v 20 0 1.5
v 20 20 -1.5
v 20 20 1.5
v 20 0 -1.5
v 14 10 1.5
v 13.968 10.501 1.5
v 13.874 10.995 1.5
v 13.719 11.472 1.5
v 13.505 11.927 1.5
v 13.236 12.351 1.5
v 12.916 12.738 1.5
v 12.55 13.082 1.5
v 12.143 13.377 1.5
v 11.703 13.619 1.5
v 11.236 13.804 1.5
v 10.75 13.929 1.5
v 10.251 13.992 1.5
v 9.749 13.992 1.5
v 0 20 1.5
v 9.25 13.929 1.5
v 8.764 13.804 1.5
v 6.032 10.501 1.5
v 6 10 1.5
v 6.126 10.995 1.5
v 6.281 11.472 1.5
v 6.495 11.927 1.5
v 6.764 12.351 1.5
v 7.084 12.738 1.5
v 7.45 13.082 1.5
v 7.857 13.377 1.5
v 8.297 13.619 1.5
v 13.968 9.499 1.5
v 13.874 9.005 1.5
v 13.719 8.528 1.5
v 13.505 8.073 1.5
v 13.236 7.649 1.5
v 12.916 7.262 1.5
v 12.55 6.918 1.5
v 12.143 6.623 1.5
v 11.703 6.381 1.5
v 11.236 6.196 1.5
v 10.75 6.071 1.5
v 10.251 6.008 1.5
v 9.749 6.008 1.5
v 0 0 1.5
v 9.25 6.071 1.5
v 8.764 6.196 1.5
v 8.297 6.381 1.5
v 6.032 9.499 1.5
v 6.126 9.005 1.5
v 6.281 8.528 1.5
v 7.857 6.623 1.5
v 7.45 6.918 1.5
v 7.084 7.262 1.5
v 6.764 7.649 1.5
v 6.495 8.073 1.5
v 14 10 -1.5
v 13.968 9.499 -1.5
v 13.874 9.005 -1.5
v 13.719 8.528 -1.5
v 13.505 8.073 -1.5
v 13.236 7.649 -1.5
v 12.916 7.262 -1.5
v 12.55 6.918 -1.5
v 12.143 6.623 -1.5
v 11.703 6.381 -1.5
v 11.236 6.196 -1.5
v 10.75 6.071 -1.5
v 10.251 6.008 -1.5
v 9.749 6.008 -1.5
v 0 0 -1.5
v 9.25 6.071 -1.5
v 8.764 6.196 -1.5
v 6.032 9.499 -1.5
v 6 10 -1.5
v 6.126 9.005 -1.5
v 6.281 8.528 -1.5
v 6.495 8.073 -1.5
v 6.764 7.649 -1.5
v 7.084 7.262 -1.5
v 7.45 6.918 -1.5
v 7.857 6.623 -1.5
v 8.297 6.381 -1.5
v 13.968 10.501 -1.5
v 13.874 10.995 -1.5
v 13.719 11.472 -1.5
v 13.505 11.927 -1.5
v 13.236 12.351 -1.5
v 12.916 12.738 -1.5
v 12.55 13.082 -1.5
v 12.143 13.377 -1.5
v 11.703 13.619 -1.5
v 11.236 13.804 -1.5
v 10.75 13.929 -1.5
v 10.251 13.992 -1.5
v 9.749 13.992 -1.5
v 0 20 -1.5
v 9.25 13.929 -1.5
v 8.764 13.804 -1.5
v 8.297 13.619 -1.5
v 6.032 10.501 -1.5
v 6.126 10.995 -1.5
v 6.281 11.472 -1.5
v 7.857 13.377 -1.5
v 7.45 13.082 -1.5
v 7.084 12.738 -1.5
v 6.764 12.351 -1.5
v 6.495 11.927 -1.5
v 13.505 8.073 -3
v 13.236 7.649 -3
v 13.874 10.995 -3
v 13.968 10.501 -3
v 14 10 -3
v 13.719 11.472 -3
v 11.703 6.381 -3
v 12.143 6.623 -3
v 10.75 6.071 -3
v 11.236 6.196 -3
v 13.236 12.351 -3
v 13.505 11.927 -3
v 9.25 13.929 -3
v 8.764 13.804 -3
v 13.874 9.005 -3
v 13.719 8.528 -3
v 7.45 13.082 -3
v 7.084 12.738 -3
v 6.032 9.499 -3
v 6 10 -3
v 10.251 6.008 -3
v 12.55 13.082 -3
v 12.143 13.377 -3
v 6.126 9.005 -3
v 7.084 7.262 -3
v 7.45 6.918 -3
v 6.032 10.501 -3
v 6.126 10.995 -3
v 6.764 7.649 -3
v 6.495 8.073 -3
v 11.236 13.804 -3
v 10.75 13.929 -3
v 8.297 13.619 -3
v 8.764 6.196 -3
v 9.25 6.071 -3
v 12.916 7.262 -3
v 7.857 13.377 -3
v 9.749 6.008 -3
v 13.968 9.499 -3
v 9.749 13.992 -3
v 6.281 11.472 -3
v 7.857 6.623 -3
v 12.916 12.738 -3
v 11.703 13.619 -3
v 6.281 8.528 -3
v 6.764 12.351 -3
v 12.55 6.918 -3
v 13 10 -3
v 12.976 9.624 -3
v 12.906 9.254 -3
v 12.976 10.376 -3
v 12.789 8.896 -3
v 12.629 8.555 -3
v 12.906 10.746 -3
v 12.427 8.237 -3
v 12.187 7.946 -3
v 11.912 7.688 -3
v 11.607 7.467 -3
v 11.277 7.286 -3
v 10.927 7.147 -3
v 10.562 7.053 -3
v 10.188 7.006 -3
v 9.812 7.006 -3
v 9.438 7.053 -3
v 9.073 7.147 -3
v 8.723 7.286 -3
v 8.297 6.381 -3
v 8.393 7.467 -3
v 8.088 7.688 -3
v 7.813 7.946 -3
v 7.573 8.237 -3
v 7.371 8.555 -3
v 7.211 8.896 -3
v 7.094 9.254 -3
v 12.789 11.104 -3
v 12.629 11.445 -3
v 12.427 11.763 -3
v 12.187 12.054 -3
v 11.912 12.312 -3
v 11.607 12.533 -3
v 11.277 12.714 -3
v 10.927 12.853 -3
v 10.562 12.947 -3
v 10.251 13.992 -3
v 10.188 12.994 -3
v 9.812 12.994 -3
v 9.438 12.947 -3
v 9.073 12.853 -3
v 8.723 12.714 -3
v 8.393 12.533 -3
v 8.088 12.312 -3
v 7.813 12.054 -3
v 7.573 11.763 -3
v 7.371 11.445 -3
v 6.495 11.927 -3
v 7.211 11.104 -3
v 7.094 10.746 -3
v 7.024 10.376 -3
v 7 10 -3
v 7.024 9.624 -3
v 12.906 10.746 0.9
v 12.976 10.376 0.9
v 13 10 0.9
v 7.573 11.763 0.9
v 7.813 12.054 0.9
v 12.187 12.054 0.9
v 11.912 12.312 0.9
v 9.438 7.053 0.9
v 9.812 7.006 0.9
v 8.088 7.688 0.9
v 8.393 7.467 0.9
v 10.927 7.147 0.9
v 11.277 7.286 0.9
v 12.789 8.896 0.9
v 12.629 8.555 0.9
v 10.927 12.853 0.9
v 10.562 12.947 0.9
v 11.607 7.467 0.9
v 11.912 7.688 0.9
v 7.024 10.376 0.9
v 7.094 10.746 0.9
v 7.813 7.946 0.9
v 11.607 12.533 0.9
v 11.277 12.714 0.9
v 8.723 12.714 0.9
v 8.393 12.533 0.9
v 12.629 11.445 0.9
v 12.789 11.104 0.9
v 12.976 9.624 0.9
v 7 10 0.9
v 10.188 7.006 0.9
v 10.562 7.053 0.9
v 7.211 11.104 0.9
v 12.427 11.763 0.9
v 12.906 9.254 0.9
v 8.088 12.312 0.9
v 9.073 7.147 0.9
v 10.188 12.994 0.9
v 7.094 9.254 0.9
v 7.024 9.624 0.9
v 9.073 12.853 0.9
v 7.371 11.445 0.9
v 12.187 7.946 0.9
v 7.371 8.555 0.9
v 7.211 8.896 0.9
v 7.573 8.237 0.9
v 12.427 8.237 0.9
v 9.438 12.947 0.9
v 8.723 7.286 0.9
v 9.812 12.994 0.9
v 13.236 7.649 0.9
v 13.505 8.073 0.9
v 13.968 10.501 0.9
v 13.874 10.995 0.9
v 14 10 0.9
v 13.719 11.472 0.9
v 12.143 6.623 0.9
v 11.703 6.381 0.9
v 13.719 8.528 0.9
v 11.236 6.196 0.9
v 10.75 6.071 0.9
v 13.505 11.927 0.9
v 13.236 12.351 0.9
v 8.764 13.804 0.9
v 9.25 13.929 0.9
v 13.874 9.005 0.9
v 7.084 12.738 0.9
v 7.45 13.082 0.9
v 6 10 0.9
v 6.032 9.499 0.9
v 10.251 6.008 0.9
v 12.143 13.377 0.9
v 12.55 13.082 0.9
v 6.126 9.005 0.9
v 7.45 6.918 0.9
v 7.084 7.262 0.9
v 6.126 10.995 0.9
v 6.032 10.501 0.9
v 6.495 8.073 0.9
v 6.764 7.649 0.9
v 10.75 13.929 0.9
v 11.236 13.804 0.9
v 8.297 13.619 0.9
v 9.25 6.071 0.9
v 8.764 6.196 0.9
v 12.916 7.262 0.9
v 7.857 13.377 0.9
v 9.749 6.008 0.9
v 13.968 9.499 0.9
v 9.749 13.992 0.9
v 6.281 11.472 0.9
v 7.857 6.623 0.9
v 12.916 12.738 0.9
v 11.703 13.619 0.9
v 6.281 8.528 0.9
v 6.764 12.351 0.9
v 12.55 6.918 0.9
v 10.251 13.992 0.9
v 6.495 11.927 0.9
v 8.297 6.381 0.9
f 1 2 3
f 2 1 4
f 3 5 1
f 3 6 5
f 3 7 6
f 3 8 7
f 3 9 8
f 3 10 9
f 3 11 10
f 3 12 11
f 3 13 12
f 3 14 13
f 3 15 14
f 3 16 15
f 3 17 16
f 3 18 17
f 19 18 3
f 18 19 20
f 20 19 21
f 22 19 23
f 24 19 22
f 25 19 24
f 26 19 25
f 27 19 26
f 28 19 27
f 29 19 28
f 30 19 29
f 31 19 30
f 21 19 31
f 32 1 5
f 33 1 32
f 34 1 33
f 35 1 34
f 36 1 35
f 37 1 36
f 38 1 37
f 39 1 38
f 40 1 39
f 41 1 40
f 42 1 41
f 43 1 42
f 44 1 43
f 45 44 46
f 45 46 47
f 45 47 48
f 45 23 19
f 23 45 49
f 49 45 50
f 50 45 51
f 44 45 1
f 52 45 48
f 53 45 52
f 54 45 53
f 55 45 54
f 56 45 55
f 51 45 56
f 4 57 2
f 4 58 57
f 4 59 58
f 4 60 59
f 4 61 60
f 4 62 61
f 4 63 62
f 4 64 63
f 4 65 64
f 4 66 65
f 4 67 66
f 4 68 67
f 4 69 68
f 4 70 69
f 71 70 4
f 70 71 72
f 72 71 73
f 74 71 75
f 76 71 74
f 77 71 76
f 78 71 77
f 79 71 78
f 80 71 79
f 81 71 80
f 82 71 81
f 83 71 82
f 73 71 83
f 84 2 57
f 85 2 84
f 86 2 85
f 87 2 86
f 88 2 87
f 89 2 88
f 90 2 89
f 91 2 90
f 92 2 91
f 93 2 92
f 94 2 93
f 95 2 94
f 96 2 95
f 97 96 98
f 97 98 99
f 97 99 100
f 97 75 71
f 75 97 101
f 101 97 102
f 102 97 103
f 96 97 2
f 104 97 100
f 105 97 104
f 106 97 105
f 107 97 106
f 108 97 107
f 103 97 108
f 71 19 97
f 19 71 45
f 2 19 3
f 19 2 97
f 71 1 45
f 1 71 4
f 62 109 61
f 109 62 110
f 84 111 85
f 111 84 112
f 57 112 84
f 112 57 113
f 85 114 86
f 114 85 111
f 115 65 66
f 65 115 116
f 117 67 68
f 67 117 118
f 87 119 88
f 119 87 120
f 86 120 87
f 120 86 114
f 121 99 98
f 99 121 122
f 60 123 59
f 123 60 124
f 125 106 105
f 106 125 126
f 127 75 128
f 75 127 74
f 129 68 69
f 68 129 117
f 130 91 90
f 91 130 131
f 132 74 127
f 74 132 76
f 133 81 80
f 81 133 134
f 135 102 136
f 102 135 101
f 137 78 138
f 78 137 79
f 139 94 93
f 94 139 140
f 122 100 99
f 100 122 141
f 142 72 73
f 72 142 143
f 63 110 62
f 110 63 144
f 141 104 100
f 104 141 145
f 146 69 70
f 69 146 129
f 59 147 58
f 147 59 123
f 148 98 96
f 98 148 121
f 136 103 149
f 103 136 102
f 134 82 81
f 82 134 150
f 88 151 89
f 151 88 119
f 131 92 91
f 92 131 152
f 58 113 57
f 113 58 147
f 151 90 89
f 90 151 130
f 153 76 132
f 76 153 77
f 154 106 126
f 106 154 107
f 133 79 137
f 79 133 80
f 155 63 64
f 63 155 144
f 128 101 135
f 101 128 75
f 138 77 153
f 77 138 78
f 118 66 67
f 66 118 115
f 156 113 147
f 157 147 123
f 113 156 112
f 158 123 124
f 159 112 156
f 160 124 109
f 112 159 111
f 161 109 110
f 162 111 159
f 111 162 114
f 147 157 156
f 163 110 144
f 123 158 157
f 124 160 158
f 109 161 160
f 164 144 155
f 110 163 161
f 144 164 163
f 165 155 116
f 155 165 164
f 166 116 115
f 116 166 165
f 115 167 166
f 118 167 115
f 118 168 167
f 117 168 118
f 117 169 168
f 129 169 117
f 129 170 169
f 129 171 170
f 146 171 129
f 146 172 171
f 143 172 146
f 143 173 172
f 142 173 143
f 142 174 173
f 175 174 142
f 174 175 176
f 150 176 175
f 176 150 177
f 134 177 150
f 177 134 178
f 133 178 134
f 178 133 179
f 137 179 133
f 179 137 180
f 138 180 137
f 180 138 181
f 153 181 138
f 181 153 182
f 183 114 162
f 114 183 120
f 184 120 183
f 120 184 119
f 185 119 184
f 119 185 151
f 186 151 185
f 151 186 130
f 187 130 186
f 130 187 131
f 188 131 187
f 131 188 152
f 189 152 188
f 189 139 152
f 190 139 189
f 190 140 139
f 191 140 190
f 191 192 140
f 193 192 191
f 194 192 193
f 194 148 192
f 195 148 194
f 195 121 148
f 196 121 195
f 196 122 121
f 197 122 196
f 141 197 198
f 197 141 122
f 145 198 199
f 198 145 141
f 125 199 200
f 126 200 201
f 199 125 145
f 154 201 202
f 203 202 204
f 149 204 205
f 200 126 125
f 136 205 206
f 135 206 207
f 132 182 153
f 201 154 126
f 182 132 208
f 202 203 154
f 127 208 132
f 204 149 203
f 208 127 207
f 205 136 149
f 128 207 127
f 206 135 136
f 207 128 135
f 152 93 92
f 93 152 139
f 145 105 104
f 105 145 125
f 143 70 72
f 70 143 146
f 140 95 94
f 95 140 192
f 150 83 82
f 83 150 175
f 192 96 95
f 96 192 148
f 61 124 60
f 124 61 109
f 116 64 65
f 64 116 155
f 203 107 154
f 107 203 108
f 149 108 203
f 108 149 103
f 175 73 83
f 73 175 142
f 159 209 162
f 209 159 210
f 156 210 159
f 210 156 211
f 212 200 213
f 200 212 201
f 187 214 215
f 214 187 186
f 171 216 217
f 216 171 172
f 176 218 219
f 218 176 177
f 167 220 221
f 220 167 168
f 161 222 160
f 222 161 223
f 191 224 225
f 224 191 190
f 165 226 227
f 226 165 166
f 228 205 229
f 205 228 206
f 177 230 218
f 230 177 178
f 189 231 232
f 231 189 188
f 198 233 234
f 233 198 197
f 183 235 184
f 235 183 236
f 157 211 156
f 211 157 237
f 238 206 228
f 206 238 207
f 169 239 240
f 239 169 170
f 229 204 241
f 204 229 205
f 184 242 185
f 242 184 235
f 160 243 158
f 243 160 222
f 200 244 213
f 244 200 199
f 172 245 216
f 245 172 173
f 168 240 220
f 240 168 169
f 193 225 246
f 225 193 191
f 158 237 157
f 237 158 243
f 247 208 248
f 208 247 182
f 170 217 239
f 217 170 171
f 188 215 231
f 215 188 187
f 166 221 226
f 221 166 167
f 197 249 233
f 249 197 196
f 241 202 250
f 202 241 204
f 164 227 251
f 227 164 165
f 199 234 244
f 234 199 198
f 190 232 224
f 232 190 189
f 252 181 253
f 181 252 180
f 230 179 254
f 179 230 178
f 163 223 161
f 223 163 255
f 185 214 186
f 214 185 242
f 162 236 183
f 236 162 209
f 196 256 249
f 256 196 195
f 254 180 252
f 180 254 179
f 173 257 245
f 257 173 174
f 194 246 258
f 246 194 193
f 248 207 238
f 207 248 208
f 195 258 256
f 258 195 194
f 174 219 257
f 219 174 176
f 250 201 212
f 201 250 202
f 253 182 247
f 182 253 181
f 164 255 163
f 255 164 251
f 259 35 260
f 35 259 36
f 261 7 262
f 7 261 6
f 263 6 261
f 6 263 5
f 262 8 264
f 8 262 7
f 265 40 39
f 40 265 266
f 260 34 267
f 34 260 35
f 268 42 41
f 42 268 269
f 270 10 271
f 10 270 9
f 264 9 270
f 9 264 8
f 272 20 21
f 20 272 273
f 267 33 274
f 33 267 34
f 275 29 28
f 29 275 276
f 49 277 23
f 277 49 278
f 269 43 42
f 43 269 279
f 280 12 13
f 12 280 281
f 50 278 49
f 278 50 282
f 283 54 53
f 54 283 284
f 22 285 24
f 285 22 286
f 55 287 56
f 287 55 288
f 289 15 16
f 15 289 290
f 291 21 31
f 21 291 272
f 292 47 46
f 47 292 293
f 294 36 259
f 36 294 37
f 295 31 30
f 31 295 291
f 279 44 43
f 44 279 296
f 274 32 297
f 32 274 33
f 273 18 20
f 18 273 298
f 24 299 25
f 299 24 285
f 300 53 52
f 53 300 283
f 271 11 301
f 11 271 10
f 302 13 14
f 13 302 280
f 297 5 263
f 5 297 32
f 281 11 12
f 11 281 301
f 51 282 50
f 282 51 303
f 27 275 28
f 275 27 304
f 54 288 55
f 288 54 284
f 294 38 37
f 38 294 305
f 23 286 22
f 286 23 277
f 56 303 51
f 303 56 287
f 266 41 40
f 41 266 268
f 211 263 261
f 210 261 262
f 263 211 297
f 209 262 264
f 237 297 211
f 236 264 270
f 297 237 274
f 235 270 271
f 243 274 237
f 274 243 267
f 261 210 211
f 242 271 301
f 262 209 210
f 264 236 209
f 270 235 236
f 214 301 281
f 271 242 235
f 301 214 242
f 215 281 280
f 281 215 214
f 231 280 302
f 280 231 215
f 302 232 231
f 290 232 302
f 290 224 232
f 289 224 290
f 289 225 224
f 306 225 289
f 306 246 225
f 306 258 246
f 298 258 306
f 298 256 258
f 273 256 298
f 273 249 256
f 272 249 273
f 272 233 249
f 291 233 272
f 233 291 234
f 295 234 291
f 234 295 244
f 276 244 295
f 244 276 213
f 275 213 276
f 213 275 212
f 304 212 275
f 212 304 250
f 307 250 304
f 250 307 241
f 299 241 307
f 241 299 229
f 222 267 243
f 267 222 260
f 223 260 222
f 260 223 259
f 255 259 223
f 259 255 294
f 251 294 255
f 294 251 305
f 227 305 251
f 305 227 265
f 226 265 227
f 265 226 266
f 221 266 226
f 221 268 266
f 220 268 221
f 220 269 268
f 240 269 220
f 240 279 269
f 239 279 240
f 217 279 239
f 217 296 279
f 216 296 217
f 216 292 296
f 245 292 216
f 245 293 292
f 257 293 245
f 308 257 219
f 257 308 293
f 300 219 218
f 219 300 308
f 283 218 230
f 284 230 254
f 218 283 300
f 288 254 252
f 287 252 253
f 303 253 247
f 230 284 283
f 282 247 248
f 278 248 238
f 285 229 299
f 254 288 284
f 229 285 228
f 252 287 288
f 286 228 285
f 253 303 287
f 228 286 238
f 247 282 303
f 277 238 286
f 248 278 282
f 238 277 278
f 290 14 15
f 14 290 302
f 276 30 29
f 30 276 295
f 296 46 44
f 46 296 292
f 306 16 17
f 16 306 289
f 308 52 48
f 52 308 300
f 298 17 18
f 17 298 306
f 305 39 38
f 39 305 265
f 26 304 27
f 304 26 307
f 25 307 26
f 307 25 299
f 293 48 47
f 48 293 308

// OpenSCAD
$fn = 50;

// 3.5mm jack
module pj392(length, width, height) {
    difference() {
        hole_radius = 3.0;
        sleve_height = 4.5;
        
        union() {
          // surface
          cube([width, length, height], true);
          // sleve
          translate([0, 0, (sleve_height - height) / -2])
            cylinder(h = sleve_height, r = 4, center = true);
        }
      
        // hole
        cylinder(h = 7, r = hole_radius, center = true);
        
        // recess
        translate([0, 0, (height / 2) - 0.3])
          cylinder(h = 0.6, r = 4, center = true);
    }
}

rows = 1;
columns = 1;

component_length = 20;
component_width = 20;
panel_thickness = 3;

translate([component_width / 2, component_length / 2, 0]) {
    for (i = [0:columns - 1]) {
        for (j = [0:rows - 1]) {
            translate([component_width * i, component_length * j, 0])
                pj392(component_length, component_width, panel_thickness, [90 + (90 * j)]);
        }
    }
}
